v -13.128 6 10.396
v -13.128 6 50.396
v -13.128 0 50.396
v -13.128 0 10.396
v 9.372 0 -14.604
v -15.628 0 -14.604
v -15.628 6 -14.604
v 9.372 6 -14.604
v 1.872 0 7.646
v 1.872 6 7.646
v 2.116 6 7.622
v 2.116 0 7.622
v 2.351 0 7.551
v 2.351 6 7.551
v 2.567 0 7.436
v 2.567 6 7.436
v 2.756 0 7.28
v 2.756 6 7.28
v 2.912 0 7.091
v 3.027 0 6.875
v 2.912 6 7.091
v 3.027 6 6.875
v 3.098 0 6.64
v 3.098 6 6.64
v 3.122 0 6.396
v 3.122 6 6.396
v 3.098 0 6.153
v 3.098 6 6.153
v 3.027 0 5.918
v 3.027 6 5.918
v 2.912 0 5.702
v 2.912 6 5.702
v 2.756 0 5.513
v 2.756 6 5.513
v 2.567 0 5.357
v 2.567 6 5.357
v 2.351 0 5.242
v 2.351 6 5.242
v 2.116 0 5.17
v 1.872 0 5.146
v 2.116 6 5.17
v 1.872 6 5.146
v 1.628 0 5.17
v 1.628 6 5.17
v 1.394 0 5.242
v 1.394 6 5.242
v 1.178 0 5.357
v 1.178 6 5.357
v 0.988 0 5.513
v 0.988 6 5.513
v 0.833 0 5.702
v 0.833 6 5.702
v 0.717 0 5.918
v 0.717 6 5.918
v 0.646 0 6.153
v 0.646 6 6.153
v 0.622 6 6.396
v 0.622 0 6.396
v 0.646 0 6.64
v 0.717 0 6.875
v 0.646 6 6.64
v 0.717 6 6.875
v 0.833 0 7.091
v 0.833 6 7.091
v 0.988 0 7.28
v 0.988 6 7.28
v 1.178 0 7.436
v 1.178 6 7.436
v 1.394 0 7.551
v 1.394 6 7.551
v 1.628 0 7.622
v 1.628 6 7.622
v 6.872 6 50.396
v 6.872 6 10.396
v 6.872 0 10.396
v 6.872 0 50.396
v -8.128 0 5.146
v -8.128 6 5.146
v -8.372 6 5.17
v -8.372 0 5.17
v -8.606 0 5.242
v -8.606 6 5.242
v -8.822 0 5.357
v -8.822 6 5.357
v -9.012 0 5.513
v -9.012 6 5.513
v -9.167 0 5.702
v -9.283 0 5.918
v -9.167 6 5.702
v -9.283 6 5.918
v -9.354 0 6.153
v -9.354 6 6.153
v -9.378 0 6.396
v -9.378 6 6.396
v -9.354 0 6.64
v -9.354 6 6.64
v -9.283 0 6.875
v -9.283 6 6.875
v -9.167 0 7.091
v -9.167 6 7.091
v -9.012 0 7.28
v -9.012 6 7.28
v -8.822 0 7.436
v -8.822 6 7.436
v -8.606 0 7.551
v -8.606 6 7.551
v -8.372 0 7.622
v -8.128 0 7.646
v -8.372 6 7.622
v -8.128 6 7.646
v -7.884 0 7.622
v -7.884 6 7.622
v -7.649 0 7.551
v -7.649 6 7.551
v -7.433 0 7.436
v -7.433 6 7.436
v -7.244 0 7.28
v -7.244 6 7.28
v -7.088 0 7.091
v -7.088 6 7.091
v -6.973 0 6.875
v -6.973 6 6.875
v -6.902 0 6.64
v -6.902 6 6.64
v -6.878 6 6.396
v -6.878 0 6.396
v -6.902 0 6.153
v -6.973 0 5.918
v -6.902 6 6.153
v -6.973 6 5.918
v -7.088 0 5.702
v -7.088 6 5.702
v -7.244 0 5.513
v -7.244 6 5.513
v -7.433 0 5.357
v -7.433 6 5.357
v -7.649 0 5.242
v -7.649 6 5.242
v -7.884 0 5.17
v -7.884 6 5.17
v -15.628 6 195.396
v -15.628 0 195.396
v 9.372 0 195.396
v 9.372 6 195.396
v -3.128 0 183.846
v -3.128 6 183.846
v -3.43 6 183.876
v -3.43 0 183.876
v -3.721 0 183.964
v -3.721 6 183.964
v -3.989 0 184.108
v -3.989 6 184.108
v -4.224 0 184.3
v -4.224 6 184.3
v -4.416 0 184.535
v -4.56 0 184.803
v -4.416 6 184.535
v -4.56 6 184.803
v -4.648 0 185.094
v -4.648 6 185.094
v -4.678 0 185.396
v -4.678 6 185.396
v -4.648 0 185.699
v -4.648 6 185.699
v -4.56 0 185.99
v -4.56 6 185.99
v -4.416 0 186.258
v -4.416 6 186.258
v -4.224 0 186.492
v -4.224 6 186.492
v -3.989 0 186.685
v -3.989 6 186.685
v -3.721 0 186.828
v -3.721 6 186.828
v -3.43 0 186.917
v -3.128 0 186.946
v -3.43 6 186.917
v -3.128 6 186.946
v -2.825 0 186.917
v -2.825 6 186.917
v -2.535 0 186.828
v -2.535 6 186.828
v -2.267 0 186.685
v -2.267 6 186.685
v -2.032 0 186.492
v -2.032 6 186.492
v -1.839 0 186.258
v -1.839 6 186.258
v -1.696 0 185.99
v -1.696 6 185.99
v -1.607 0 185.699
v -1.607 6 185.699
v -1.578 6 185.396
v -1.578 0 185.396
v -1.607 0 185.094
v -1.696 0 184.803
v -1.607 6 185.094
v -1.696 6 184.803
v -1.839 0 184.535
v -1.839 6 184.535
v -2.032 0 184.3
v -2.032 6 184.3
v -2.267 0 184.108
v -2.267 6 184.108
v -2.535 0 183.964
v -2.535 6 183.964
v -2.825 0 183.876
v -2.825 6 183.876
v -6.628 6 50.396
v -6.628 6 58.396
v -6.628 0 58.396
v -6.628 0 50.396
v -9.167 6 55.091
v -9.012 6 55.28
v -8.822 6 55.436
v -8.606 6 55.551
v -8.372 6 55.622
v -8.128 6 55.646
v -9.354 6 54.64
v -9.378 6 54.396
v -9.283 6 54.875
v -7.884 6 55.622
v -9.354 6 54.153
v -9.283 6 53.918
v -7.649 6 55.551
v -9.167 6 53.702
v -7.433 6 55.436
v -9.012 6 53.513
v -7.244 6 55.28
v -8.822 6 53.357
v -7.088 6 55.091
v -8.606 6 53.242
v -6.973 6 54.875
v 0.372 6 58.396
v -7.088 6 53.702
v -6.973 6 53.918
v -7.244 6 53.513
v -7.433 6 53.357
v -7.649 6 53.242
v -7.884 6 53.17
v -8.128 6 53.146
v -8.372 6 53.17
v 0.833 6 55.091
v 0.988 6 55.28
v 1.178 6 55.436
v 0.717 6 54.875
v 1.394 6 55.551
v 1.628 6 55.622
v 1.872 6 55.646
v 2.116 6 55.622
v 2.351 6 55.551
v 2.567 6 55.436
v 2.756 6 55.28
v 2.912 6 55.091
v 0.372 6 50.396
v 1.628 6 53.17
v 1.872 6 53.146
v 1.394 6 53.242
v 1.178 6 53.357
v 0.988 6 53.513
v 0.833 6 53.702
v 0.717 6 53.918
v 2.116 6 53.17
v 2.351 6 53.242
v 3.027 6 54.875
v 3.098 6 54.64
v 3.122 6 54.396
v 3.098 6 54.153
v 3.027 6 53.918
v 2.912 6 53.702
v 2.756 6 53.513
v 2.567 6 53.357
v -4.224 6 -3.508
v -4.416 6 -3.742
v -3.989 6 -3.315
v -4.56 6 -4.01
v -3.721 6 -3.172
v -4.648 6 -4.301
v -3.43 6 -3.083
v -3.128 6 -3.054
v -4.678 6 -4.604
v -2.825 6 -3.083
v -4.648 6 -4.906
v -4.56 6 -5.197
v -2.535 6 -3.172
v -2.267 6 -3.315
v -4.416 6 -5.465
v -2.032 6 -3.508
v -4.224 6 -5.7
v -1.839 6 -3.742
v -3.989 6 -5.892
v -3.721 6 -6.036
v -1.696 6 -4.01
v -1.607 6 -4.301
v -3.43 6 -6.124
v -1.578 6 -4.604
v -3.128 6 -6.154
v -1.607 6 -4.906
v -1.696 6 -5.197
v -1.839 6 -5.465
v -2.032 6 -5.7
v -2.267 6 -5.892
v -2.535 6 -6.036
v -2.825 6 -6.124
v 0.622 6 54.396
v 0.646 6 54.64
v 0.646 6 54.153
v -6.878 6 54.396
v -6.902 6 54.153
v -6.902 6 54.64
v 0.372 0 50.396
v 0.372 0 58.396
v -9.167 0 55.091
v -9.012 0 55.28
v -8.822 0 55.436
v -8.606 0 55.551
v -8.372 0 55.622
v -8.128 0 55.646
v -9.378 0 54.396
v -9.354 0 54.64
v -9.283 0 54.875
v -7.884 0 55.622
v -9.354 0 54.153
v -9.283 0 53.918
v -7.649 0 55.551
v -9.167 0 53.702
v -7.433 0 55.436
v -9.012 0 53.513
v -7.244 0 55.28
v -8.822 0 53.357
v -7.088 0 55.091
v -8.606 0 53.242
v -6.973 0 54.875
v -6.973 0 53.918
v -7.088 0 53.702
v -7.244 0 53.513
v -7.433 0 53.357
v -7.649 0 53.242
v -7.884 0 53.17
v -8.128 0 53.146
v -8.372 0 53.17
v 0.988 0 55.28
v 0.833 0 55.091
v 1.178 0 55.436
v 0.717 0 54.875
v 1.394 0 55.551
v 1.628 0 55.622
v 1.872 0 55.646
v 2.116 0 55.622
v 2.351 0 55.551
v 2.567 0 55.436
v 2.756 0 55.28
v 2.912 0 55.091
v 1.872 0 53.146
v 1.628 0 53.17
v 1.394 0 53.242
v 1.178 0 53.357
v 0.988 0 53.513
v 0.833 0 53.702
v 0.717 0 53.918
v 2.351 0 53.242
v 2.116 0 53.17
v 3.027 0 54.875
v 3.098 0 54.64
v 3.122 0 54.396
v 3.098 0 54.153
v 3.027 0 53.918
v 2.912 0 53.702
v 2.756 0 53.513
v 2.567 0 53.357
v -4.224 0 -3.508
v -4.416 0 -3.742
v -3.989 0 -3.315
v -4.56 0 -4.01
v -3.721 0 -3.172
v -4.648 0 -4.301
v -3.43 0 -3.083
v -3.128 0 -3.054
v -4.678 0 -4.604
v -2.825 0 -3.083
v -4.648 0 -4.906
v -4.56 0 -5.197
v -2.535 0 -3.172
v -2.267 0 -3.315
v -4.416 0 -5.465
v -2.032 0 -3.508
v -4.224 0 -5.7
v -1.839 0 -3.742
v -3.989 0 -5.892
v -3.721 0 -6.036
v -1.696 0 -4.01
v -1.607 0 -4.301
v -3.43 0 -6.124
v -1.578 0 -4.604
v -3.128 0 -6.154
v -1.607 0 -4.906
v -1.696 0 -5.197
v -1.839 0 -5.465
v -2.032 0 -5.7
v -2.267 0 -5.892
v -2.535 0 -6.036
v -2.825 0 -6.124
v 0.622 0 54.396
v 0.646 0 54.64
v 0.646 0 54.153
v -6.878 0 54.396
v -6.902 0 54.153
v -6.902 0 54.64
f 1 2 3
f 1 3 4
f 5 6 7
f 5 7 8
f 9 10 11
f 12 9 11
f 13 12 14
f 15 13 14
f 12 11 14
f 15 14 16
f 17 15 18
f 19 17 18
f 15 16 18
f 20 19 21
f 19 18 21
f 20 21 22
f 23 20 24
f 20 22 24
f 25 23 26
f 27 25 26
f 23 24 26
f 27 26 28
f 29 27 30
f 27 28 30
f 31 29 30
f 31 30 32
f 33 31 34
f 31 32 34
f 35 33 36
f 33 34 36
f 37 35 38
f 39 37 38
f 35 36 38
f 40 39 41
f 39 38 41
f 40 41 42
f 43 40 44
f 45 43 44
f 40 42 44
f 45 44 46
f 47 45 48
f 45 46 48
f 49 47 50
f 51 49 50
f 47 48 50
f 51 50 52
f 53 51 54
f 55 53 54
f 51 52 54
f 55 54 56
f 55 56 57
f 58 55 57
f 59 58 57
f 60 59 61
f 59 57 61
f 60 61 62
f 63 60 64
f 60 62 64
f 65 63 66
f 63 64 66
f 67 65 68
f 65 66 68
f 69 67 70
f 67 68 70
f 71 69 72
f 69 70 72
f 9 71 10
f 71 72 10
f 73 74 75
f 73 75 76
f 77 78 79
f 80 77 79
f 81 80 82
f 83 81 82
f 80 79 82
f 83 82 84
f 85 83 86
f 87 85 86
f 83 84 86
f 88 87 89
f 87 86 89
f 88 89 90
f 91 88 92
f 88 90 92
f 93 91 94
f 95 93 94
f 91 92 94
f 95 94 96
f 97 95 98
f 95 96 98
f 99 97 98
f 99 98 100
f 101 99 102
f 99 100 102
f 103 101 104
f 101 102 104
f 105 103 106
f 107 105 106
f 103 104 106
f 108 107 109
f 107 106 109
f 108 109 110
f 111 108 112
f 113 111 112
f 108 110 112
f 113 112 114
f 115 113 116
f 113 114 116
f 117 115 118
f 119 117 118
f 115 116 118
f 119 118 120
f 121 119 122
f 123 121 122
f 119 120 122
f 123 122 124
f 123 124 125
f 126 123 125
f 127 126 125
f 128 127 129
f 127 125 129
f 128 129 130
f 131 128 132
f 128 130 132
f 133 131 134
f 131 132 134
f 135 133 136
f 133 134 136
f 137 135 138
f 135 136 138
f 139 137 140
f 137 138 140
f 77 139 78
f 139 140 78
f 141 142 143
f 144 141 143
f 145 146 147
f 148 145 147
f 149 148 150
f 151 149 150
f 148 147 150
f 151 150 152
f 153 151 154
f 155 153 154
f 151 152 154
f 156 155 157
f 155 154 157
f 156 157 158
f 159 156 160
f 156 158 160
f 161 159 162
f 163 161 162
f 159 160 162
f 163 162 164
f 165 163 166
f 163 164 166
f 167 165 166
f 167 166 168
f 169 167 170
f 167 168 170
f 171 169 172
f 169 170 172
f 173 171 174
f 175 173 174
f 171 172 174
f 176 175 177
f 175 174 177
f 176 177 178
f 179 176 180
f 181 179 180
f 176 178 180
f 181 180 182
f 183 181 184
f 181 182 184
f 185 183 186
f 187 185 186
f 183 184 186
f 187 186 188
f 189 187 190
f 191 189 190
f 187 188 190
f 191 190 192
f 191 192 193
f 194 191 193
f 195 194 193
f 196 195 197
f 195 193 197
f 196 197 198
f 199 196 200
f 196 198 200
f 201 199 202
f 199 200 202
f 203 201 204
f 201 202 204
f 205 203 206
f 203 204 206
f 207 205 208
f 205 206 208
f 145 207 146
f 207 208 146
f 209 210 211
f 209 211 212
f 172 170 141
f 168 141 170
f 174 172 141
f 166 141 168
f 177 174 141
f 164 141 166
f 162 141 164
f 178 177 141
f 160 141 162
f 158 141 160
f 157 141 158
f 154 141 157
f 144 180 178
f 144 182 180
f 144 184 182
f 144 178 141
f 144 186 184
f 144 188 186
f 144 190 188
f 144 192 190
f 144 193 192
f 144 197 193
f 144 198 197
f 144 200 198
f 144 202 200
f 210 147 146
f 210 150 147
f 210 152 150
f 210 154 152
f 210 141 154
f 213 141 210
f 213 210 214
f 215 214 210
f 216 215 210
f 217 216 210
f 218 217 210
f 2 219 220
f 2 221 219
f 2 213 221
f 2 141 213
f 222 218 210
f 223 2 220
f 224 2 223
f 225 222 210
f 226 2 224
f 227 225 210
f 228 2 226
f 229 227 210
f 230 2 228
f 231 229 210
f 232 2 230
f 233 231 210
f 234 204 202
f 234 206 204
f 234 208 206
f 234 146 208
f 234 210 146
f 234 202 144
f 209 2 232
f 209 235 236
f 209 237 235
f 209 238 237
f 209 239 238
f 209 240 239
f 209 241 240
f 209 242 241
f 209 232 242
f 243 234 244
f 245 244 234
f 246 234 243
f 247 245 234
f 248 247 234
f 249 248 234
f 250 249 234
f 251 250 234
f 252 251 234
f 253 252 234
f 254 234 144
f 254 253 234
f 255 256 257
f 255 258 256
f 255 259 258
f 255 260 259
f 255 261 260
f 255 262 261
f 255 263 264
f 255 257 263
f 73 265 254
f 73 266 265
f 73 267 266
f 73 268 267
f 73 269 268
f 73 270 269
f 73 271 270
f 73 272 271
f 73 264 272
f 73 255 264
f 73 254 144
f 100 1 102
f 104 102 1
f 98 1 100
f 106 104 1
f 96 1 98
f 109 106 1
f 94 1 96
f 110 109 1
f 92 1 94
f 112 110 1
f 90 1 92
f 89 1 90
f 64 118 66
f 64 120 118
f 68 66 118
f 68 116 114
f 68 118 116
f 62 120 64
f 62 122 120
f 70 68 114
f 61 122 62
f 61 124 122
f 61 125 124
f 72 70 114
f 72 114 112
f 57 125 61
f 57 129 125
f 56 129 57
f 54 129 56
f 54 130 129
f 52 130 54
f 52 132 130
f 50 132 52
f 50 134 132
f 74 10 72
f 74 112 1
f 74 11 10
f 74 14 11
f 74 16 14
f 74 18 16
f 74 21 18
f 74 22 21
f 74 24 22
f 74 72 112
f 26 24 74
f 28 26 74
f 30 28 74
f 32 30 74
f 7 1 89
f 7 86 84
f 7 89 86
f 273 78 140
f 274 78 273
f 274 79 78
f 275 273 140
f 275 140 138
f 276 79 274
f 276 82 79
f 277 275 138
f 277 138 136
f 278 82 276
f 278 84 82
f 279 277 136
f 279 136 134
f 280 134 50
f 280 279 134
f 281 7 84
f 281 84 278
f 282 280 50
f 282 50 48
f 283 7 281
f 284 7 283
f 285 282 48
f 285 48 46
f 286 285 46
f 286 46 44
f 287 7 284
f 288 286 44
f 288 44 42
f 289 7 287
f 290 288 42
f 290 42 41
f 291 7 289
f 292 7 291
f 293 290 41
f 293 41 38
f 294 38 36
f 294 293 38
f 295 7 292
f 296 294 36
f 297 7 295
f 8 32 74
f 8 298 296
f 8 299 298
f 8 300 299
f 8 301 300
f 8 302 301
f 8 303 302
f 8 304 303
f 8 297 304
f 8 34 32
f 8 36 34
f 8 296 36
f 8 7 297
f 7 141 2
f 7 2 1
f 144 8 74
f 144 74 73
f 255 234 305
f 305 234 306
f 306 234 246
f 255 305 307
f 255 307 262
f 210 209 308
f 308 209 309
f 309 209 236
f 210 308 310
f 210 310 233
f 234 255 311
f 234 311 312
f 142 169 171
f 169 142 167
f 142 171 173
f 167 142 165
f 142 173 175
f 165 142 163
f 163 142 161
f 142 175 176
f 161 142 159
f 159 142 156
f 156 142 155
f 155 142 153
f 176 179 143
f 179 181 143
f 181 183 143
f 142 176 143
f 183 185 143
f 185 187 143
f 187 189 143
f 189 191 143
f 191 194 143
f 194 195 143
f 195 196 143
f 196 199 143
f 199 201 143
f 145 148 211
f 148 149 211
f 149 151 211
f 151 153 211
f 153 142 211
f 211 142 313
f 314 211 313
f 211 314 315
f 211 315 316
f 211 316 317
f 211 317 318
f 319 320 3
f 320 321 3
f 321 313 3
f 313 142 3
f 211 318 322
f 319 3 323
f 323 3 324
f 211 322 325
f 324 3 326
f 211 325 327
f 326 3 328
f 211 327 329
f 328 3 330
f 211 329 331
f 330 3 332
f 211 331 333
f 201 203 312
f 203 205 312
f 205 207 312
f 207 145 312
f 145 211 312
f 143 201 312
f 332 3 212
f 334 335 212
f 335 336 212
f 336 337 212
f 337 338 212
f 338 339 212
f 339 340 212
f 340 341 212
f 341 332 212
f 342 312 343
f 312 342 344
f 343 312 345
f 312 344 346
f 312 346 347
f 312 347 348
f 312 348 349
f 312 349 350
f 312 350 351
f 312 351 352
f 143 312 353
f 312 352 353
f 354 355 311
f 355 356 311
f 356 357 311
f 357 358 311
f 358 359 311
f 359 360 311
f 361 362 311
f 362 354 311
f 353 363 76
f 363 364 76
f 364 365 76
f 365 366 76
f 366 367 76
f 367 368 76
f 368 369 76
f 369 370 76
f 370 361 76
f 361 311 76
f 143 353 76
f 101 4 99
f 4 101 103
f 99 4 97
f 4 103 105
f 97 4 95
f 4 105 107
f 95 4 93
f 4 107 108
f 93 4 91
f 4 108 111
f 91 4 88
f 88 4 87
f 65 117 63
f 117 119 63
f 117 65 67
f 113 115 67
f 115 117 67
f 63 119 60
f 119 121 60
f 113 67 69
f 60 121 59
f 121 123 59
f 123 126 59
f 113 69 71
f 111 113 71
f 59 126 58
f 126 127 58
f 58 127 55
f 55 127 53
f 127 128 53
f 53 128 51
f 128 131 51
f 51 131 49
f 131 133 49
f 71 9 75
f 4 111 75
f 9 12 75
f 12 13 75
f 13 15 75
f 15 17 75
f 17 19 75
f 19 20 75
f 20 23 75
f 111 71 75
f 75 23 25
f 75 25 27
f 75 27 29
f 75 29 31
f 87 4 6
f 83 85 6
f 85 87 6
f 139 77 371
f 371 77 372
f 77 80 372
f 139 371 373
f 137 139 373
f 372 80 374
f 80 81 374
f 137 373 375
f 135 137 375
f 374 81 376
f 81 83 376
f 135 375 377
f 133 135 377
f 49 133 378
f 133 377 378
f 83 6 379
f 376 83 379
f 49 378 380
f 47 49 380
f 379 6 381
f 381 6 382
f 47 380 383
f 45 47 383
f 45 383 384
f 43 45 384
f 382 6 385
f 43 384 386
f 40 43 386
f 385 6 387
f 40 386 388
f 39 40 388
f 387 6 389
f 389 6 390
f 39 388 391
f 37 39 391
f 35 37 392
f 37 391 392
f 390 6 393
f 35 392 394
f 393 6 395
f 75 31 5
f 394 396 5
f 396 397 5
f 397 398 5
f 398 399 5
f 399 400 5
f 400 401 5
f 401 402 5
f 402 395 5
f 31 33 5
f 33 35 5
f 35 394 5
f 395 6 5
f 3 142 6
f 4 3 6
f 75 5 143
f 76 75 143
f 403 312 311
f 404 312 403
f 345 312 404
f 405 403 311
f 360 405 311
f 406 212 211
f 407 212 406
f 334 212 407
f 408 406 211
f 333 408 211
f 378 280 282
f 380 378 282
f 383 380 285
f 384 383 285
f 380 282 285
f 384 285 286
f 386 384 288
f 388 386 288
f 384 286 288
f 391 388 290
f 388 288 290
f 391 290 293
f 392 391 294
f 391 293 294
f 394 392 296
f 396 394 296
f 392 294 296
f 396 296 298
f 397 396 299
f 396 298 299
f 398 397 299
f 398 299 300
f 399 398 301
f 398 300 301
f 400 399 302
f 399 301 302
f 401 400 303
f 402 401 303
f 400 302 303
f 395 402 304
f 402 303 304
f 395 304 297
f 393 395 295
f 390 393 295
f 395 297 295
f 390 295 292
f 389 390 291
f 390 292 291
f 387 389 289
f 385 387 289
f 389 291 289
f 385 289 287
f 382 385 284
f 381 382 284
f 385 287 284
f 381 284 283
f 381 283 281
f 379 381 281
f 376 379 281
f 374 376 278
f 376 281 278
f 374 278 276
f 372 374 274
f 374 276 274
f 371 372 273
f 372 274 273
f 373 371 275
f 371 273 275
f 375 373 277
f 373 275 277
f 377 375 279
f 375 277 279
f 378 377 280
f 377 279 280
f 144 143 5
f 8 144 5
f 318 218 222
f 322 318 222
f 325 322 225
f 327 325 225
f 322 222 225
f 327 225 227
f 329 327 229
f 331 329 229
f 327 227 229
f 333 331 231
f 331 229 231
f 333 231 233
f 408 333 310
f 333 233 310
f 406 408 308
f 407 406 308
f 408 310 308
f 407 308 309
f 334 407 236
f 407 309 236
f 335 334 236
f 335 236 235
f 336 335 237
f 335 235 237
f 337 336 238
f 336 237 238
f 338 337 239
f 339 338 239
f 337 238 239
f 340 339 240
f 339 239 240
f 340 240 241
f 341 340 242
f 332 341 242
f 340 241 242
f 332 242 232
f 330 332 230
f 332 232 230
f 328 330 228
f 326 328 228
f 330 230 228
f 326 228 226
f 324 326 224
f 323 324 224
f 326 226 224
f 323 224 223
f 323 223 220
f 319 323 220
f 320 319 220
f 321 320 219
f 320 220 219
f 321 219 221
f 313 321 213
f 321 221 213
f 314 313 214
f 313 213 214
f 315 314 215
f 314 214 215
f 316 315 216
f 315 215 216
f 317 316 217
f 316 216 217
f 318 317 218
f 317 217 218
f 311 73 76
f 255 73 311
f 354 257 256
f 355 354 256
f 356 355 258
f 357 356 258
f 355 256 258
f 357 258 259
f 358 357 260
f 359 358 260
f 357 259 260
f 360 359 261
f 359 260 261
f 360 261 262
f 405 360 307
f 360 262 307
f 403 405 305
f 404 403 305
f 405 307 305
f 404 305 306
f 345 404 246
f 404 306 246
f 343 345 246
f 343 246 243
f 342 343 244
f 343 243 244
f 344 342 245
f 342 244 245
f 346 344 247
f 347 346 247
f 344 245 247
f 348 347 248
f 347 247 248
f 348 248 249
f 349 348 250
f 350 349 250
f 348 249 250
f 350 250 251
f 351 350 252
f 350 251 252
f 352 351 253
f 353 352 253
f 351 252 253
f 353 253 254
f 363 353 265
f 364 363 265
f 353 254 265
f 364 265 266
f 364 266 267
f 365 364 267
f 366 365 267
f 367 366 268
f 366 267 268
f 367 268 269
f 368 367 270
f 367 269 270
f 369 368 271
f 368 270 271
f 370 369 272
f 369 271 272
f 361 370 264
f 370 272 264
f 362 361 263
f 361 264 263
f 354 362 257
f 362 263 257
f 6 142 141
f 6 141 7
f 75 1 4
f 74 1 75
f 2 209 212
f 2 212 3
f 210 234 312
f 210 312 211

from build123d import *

# Parameters (mm, degrees)
SKETCH_1_W          = 25
SKETCH_1_H          = 210
EXTRUDE_1_DEPTH     = 6
SKETCH_2_R          = 1.55
CUT_EXTRUDE_1_DEPTH = 6
SKETCH_3_R          = 1.25
CUT_EXTRUDE_2_DEPTH = 6


with BuildPart() as part:
    # Эскиз1 → Бобышка-Вытянуть1 (new body)
    with BuildSketch(Plane(origin=(0, 0, 0), x_dir=(1, 0, 0), z_dir=(0, 1, 0))):
        with Locations((-3.127715508, -90.396451994)):
            Rectangle(SKETCH_1_W, SKETCH_1_H)
    extrude(amount=EXTRUDE_1_DEPTH)

    # Эскиз2 → Вырез-Вытянуть1 (cut)
    with BuildSketch(Plane(origin=(0, 6, 0), x_dir=(1, 0, 0), z_dir=(0, 1, 0))):
        with Locations(Location((-3.127715508, 4.603548006, 0), (0, 0, 270))):
            Circle(SKETCH_2_R)
        with Locations(Location((-3.127715508, -185.396451994, 0), (0, 0, 90))):
            Circle(SKETCH_2_R)
    extrude(amount=-CUT_EXTRUDE_1_DEPTH, mode=Mode.SUBTRACT)

    # Эскиз3 → Вырез-Вытянуть2 (cut)
    with BuildSketch(Plane(origin=(0, 6, 0), x_dir=(1, 0, 0), z_dir=(0, 1, 0))):
        with Locations(Location((-8.127715508, -54.396451994, 0), (0, 0, 270))):
            Circle(SKETCH_3_R)
        with Locations(Location((1.872284492, -54.396451994, 0), (0, 0, 90))):
            Circle(SKETCH_3_R)
        with Locations(Location((1.872284492, -6.396451994, 0), (0, 0, 270))):
            Circle(SKETCH_3_R)
        with Locations(Location((-8.127715508, -6.396451994, 0), (0, 0, 90))):
            Circle(SKETCH_3_R)
        Polygon((-13.127715508, -10.396451994), (6.872284492, -10.396451994), (6.872284492, -50.396451994), (0.372284492, -50.396451994), (0.372284492, -58.396451994), (-6.627715508, -58.396451994), (-6.627715508, -50.396451994), (-13.127715508, -50.396451994), align=None)
    extrude(amount=-CUT_EXTRUDE_2_DEPTH, mode=Mode.SUBTRACT)


solid = part.part
